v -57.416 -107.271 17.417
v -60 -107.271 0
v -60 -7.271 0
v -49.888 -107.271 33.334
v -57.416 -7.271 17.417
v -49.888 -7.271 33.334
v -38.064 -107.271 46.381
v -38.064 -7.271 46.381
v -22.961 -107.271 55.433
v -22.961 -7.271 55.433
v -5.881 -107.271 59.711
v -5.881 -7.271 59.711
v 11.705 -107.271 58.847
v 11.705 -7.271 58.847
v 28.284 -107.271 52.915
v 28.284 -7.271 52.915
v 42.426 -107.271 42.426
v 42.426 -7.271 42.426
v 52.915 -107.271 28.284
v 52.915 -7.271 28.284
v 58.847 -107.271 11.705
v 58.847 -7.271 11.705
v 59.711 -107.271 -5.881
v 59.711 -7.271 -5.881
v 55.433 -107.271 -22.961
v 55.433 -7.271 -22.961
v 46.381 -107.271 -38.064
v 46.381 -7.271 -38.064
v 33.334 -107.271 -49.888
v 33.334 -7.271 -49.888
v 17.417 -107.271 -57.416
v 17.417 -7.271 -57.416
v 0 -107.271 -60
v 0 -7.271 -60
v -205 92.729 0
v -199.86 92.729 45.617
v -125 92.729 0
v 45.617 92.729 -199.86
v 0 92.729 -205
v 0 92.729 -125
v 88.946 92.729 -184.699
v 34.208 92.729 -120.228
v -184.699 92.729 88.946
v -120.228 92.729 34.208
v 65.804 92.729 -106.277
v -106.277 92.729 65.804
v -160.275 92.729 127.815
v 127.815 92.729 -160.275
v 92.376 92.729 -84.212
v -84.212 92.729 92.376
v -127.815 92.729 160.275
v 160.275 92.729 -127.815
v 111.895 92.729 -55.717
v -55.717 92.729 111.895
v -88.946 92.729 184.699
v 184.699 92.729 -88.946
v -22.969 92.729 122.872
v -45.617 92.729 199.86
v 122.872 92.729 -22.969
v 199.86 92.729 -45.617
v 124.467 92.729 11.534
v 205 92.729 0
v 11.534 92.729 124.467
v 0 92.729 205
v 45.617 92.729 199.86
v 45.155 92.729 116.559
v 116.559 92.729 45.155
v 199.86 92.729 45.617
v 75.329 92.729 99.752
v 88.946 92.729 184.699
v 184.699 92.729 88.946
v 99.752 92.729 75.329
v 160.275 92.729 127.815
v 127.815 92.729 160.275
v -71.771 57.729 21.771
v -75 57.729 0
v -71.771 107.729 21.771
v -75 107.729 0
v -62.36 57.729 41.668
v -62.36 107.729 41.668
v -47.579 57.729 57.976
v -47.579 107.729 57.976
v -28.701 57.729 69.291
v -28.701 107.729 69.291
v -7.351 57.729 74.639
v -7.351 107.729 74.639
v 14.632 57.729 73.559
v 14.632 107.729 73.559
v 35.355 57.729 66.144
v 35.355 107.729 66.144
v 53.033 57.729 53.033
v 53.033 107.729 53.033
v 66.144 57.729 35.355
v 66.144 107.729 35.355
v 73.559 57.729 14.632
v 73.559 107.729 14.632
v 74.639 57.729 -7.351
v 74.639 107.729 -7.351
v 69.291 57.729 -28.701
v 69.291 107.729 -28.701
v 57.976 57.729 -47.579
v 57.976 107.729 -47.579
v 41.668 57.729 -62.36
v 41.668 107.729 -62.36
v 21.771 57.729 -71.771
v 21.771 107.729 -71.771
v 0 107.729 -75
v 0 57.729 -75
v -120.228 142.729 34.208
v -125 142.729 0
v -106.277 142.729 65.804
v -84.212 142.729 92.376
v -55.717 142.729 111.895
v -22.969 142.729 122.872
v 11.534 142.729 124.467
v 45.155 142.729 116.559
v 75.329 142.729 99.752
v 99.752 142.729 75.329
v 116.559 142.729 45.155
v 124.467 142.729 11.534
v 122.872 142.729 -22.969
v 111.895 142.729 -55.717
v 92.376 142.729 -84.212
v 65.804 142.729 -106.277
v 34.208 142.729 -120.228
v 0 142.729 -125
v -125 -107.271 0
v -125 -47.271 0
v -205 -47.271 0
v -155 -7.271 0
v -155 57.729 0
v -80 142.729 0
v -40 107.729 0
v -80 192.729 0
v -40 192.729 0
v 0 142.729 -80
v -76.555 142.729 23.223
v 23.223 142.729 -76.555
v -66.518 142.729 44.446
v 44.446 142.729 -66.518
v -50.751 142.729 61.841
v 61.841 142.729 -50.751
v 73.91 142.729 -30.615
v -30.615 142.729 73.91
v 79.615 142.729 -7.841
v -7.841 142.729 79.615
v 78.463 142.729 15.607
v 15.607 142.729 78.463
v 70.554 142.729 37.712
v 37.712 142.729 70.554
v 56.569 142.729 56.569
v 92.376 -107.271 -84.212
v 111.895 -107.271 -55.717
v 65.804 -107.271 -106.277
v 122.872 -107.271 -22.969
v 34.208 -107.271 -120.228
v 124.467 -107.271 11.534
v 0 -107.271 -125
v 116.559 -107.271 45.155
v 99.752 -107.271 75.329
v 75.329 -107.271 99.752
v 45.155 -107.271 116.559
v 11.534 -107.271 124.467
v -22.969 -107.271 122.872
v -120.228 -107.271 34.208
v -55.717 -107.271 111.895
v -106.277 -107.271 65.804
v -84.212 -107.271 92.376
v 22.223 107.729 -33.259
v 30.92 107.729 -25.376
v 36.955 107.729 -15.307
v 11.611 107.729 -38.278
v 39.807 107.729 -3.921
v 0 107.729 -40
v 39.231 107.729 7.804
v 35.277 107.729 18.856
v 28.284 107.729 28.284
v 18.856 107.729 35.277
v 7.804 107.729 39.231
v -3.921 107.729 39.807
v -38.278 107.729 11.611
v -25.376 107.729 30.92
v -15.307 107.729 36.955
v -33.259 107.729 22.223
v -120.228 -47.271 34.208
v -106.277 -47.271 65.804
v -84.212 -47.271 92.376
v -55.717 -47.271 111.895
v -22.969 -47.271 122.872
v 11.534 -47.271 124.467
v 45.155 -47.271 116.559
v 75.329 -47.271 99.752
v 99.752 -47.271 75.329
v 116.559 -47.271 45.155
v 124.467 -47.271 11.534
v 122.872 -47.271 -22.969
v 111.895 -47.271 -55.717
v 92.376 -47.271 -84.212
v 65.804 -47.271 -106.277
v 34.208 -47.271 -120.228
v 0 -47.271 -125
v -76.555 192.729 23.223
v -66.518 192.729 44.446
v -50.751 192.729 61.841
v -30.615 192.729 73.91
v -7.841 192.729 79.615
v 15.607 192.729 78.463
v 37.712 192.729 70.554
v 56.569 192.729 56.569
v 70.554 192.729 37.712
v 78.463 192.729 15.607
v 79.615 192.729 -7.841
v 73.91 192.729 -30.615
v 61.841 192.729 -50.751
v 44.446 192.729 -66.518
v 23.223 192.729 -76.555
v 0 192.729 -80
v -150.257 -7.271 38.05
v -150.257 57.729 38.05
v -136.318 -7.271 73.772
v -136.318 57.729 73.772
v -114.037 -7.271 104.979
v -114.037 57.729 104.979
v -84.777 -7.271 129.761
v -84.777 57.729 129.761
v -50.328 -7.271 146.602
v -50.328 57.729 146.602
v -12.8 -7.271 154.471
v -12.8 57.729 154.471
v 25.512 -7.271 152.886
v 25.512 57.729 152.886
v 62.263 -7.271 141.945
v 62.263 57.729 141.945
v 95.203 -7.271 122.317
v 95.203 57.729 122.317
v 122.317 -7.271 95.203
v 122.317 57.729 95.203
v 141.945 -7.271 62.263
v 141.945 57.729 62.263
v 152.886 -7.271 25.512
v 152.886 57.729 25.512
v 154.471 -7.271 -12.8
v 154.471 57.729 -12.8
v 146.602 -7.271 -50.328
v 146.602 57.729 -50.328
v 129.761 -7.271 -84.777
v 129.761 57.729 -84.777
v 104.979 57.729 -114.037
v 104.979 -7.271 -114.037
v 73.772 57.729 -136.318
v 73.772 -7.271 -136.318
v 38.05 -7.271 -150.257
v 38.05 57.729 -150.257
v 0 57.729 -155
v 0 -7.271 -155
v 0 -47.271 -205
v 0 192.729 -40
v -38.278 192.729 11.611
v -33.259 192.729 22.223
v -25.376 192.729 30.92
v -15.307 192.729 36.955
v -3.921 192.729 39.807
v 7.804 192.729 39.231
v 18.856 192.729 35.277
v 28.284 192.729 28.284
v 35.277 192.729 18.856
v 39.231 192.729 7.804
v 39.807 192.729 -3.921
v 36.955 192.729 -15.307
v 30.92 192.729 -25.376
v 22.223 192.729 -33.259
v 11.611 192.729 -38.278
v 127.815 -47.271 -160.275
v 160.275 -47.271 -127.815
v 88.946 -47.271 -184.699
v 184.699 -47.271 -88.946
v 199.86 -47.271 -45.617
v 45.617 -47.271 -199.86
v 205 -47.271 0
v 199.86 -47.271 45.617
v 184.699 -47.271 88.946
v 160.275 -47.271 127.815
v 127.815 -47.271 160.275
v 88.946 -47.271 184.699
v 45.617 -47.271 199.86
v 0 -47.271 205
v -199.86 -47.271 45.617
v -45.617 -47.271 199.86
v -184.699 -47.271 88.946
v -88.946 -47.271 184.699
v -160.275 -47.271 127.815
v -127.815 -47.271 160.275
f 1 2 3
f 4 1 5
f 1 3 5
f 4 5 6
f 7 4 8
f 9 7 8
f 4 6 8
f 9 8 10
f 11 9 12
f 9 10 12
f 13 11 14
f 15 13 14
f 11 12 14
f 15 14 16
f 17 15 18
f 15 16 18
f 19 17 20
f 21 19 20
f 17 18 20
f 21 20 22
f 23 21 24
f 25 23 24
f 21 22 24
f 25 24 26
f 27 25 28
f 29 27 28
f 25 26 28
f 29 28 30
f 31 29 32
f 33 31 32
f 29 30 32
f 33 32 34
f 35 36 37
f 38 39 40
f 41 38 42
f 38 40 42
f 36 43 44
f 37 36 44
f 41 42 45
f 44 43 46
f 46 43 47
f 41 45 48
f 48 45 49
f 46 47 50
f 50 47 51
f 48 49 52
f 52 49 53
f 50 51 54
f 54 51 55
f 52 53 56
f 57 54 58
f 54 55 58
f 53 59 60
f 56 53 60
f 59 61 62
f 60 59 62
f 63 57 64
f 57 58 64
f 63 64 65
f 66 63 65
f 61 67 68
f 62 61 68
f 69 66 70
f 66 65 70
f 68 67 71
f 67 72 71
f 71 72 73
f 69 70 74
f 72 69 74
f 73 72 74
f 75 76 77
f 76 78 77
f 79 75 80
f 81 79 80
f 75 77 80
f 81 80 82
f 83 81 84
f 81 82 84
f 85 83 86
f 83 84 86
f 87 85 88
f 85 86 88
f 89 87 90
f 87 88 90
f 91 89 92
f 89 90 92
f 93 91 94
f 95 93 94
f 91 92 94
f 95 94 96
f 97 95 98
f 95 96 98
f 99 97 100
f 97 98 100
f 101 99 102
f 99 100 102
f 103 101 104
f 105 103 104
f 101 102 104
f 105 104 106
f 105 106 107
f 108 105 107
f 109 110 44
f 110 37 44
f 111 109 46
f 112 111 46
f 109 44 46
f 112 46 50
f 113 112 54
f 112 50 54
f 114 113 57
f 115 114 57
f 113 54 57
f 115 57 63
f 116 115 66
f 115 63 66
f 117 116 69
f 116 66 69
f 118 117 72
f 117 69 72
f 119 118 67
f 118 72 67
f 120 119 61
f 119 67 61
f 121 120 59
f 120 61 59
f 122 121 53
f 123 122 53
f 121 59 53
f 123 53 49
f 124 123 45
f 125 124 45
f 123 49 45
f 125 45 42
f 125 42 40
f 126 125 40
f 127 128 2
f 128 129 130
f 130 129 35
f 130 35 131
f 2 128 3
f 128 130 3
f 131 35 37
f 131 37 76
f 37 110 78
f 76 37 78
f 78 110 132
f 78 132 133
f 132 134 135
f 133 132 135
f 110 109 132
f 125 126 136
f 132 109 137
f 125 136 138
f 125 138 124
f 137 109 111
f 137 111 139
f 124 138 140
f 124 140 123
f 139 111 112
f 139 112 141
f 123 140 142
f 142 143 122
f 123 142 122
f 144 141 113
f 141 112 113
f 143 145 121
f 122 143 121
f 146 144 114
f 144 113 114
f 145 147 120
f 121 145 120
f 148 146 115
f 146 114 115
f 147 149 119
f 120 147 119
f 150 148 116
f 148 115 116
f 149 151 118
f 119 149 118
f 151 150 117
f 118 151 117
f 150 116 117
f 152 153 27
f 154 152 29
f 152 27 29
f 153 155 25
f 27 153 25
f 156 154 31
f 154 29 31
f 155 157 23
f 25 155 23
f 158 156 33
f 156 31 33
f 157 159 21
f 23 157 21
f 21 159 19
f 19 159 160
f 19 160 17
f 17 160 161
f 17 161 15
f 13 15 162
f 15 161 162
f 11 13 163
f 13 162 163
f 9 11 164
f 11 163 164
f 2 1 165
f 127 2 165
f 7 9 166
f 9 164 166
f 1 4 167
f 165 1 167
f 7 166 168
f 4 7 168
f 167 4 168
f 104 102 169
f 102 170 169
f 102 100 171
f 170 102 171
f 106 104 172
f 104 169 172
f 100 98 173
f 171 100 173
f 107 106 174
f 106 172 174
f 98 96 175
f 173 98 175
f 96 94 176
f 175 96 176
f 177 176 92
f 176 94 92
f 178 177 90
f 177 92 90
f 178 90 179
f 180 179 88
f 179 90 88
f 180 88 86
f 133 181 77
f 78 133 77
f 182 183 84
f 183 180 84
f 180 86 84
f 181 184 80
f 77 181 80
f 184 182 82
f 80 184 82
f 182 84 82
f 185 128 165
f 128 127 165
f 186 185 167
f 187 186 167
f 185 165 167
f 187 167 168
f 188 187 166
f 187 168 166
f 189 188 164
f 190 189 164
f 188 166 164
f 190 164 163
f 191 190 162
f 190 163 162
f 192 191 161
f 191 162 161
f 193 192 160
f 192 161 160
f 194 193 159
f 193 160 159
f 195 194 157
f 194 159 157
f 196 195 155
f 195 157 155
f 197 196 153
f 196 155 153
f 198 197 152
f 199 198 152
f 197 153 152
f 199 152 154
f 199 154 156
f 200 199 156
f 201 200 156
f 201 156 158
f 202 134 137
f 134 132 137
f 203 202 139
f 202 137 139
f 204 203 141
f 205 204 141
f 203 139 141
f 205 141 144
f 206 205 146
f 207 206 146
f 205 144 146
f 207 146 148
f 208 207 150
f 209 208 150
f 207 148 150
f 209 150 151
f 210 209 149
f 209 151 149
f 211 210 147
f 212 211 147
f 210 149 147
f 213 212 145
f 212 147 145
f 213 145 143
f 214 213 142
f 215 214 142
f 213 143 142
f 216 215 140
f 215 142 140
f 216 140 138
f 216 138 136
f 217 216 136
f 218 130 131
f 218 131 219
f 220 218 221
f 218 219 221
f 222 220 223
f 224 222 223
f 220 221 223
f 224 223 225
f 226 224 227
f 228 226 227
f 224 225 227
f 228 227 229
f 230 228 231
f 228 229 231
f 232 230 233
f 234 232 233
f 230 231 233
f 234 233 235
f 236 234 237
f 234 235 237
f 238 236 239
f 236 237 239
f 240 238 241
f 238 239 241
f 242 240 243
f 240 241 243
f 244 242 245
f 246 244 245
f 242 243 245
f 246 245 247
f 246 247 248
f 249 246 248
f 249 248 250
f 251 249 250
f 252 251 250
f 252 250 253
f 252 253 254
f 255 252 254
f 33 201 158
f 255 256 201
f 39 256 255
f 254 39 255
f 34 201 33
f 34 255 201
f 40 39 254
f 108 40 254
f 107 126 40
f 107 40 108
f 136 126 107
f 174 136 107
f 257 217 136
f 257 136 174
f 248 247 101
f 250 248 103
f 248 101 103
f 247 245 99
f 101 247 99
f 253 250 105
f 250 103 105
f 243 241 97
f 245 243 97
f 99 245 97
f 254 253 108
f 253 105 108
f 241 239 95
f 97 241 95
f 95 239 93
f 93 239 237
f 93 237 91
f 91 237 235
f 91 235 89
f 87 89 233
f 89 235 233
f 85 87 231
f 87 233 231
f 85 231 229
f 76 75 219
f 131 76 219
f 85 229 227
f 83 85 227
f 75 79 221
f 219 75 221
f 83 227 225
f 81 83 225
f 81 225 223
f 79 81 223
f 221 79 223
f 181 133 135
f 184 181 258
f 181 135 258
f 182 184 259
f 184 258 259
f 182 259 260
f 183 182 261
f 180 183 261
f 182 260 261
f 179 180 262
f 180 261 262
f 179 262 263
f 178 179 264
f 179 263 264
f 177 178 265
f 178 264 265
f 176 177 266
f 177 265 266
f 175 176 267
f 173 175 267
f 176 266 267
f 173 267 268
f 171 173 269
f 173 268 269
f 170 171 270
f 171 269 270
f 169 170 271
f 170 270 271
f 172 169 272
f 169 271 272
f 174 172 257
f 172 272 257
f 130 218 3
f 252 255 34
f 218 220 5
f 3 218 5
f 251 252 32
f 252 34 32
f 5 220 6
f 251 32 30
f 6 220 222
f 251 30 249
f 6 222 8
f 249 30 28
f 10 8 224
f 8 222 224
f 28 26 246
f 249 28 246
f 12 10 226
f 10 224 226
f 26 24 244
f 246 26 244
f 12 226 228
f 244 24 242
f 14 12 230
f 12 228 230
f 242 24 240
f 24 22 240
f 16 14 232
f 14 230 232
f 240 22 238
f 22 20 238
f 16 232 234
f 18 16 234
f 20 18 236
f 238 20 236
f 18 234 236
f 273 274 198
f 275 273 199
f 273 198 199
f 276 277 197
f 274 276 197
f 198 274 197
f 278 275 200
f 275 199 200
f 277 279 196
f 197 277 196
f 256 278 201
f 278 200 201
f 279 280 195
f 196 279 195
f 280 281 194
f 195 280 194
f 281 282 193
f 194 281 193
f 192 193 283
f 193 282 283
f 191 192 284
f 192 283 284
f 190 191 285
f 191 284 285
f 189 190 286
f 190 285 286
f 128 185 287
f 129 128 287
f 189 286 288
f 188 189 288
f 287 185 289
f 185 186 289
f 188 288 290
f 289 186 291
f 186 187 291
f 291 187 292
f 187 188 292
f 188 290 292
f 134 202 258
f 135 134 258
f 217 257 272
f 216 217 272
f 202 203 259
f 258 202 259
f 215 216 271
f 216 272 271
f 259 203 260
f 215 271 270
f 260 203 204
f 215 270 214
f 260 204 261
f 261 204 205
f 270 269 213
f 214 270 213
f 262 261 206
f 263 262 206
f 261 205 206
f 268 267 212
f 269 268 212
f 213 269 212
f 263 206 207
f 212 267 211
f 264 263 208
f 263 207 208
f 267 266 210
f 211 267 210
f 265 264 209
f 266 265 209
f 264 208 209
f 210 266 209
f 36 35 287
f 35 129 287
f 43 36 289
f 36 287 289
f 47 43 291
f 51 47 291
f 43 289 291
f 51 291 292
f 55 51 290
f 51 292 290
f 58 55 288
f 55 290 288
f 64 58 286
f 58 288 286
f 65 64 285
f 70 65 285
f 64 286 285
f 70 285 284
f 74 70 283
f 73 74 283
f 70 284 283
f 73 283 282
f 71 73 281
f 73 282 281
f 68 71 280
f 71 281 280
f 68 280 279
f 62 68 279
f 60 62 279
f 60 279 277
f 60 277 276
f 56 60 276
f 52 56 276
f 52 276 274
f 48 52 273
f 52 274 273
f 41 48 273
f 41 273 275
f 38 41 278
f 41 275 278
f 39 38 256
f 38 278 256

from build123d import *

# Parameters (mm, degrees)
REVOLVE1_ANGLE = 270


with BuildPart() as part:
    # Sketch1 → Revolve1 (revolve)
    with BuildSketch(Plane.XY):
        Polygon((-40, 192.728692059), (-80, 192.728692059), (-80, 142.728692059), (-125, 142.728692059), (-125, 92.728692059), (-205, 92.728692059), (-205, -47.271307941), (-125, -47.271307941), (-125, -107.271307941), (-60, -107.271307941), (-60, -7.271307941), (-155, -7.271307941), (-155, 57.728692059), (-75, 57.728692059), (-75, 107.728692059), (-40, 107.728692059), align=None)
    revolve(axis=Axis((0, -107.271307941, 0), (0, 1, 0)), revolution_arc=REVOLVE1_ANGLE)


solid = part.part
